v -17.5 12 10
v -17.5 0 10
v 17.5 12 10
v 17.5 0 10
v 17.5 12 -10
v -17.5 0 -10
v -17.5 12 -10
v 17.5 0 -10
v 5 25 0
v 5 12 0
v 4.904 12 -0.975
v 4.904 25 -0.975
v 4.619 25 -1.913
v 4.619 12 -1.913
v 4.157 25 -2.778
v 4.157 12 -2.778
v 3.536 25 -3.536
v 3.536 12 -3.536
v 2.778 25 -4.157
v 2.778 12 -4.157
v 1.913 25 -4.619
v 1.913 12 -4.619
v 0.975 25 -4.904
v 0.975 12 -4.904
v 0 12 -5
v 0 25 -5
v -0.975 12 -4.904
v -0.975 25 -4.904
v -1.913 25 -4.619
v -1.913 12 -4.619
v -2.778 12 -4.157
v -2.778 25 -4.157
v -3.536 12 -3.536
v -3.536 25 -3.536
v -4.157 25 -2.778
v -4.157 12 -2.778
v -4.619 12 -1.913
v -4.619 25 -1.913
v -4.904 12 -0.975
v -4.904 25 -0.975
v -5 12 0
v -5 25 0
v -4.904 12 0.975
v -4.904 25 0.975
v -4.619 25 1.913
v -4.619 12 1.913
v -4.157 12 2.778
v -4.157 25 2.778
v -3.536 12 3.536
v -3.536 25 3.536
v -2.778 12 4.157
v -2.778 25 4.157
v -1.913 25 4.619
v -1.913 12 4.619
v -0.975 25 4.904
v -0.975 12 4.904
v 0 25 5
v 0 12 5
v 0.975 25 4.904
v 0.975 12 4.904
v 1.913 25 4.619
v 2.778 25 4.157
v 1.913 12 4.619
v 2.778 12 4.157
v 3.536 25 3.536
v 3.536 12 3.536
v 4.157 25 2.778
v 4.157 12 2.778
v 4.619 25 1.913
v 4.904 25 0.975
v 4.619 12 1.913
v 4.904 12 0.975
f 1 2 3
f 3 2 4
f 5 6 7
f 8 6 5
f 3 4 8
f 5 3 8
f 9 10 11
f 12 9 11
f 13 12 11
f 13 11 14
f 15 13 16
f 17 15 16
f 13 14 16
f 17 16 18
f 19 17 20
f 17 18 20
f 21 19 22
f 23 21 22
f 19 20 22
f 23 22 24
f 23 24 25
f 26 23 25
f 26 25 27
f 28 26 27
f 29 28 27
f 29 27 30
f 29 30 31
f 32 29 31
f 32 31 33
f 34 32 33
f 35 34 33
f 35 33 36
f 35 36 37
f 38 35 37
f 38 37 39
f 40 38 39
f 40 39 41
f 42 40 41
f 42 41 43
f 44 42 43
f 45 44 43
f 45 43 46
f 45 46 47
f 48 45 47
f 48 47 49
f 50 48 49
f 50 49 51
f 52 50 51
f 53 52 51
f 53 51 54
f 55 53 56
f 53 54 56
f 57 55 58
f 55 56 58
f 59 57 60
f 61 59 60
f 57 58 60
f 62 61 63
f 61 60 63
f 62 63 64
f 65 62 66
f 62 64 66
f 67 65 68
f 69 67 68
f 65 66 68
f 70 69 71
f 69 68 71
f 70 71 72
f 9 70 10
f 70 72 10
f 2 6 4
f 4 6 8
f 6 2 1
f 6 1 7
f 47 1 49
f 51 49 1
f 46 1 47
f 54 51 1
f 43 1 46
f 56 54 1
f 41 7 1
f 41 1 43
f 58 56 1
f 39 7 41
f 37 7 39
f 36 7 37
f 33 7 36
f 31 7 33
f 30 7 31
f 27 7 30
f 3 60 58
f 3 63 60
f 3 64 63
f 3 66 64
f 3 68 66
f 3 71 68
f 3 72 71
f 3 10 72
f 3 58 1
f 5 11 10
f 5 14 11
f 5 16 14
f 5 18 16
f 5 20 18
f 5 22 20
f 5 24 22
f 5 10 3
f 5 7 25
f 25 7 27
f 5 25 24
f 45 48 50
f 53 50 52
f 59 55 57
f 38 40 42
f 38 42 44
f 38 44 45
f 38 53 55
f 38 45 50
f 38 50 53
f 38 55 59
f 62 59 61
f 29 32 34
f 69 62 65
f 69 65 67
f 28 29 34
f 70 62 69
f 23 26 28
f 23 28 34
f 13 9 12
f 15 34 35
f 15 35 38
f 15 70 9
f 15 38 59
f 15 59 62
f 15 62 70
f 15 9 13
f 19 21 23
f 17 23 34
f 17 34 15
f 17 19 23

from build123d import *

# Parameters (mm, degrees)
SKETCH1_W           = 35
SKETCH1_H           = 20
BOSS_EXTRUDE1_DEPTH = 12
SKETCH1_3_R         = 5
BOSS_EXTRUDE2_DEPTH = 25


with BuildPart() as part:
    # Sketch1 → Boss-Extrude1 (new body)
    with BuildSketch(Plane(origin=(0, 0, 0), x_dir=(1, 0, 0), z_dir=(0, 1, 0))):
        Rectangle(SKETCH1_W, SKETCH1_H)
    extrude(amount=BOSS_EXTRUDE1_DEPTH)

    # Sketch1_3 → Boss-Extrude2 (add)
    with BuildSketch(Plane(origin=(0, 0, 0), x_dir=(1, 0, 0), z_dir=(0, 1, 0))):
        Circle(SKETCH1_3_R)
    extrude(amount=BOSS_EXTRUDE2_DEPTH)


solid = part.part
